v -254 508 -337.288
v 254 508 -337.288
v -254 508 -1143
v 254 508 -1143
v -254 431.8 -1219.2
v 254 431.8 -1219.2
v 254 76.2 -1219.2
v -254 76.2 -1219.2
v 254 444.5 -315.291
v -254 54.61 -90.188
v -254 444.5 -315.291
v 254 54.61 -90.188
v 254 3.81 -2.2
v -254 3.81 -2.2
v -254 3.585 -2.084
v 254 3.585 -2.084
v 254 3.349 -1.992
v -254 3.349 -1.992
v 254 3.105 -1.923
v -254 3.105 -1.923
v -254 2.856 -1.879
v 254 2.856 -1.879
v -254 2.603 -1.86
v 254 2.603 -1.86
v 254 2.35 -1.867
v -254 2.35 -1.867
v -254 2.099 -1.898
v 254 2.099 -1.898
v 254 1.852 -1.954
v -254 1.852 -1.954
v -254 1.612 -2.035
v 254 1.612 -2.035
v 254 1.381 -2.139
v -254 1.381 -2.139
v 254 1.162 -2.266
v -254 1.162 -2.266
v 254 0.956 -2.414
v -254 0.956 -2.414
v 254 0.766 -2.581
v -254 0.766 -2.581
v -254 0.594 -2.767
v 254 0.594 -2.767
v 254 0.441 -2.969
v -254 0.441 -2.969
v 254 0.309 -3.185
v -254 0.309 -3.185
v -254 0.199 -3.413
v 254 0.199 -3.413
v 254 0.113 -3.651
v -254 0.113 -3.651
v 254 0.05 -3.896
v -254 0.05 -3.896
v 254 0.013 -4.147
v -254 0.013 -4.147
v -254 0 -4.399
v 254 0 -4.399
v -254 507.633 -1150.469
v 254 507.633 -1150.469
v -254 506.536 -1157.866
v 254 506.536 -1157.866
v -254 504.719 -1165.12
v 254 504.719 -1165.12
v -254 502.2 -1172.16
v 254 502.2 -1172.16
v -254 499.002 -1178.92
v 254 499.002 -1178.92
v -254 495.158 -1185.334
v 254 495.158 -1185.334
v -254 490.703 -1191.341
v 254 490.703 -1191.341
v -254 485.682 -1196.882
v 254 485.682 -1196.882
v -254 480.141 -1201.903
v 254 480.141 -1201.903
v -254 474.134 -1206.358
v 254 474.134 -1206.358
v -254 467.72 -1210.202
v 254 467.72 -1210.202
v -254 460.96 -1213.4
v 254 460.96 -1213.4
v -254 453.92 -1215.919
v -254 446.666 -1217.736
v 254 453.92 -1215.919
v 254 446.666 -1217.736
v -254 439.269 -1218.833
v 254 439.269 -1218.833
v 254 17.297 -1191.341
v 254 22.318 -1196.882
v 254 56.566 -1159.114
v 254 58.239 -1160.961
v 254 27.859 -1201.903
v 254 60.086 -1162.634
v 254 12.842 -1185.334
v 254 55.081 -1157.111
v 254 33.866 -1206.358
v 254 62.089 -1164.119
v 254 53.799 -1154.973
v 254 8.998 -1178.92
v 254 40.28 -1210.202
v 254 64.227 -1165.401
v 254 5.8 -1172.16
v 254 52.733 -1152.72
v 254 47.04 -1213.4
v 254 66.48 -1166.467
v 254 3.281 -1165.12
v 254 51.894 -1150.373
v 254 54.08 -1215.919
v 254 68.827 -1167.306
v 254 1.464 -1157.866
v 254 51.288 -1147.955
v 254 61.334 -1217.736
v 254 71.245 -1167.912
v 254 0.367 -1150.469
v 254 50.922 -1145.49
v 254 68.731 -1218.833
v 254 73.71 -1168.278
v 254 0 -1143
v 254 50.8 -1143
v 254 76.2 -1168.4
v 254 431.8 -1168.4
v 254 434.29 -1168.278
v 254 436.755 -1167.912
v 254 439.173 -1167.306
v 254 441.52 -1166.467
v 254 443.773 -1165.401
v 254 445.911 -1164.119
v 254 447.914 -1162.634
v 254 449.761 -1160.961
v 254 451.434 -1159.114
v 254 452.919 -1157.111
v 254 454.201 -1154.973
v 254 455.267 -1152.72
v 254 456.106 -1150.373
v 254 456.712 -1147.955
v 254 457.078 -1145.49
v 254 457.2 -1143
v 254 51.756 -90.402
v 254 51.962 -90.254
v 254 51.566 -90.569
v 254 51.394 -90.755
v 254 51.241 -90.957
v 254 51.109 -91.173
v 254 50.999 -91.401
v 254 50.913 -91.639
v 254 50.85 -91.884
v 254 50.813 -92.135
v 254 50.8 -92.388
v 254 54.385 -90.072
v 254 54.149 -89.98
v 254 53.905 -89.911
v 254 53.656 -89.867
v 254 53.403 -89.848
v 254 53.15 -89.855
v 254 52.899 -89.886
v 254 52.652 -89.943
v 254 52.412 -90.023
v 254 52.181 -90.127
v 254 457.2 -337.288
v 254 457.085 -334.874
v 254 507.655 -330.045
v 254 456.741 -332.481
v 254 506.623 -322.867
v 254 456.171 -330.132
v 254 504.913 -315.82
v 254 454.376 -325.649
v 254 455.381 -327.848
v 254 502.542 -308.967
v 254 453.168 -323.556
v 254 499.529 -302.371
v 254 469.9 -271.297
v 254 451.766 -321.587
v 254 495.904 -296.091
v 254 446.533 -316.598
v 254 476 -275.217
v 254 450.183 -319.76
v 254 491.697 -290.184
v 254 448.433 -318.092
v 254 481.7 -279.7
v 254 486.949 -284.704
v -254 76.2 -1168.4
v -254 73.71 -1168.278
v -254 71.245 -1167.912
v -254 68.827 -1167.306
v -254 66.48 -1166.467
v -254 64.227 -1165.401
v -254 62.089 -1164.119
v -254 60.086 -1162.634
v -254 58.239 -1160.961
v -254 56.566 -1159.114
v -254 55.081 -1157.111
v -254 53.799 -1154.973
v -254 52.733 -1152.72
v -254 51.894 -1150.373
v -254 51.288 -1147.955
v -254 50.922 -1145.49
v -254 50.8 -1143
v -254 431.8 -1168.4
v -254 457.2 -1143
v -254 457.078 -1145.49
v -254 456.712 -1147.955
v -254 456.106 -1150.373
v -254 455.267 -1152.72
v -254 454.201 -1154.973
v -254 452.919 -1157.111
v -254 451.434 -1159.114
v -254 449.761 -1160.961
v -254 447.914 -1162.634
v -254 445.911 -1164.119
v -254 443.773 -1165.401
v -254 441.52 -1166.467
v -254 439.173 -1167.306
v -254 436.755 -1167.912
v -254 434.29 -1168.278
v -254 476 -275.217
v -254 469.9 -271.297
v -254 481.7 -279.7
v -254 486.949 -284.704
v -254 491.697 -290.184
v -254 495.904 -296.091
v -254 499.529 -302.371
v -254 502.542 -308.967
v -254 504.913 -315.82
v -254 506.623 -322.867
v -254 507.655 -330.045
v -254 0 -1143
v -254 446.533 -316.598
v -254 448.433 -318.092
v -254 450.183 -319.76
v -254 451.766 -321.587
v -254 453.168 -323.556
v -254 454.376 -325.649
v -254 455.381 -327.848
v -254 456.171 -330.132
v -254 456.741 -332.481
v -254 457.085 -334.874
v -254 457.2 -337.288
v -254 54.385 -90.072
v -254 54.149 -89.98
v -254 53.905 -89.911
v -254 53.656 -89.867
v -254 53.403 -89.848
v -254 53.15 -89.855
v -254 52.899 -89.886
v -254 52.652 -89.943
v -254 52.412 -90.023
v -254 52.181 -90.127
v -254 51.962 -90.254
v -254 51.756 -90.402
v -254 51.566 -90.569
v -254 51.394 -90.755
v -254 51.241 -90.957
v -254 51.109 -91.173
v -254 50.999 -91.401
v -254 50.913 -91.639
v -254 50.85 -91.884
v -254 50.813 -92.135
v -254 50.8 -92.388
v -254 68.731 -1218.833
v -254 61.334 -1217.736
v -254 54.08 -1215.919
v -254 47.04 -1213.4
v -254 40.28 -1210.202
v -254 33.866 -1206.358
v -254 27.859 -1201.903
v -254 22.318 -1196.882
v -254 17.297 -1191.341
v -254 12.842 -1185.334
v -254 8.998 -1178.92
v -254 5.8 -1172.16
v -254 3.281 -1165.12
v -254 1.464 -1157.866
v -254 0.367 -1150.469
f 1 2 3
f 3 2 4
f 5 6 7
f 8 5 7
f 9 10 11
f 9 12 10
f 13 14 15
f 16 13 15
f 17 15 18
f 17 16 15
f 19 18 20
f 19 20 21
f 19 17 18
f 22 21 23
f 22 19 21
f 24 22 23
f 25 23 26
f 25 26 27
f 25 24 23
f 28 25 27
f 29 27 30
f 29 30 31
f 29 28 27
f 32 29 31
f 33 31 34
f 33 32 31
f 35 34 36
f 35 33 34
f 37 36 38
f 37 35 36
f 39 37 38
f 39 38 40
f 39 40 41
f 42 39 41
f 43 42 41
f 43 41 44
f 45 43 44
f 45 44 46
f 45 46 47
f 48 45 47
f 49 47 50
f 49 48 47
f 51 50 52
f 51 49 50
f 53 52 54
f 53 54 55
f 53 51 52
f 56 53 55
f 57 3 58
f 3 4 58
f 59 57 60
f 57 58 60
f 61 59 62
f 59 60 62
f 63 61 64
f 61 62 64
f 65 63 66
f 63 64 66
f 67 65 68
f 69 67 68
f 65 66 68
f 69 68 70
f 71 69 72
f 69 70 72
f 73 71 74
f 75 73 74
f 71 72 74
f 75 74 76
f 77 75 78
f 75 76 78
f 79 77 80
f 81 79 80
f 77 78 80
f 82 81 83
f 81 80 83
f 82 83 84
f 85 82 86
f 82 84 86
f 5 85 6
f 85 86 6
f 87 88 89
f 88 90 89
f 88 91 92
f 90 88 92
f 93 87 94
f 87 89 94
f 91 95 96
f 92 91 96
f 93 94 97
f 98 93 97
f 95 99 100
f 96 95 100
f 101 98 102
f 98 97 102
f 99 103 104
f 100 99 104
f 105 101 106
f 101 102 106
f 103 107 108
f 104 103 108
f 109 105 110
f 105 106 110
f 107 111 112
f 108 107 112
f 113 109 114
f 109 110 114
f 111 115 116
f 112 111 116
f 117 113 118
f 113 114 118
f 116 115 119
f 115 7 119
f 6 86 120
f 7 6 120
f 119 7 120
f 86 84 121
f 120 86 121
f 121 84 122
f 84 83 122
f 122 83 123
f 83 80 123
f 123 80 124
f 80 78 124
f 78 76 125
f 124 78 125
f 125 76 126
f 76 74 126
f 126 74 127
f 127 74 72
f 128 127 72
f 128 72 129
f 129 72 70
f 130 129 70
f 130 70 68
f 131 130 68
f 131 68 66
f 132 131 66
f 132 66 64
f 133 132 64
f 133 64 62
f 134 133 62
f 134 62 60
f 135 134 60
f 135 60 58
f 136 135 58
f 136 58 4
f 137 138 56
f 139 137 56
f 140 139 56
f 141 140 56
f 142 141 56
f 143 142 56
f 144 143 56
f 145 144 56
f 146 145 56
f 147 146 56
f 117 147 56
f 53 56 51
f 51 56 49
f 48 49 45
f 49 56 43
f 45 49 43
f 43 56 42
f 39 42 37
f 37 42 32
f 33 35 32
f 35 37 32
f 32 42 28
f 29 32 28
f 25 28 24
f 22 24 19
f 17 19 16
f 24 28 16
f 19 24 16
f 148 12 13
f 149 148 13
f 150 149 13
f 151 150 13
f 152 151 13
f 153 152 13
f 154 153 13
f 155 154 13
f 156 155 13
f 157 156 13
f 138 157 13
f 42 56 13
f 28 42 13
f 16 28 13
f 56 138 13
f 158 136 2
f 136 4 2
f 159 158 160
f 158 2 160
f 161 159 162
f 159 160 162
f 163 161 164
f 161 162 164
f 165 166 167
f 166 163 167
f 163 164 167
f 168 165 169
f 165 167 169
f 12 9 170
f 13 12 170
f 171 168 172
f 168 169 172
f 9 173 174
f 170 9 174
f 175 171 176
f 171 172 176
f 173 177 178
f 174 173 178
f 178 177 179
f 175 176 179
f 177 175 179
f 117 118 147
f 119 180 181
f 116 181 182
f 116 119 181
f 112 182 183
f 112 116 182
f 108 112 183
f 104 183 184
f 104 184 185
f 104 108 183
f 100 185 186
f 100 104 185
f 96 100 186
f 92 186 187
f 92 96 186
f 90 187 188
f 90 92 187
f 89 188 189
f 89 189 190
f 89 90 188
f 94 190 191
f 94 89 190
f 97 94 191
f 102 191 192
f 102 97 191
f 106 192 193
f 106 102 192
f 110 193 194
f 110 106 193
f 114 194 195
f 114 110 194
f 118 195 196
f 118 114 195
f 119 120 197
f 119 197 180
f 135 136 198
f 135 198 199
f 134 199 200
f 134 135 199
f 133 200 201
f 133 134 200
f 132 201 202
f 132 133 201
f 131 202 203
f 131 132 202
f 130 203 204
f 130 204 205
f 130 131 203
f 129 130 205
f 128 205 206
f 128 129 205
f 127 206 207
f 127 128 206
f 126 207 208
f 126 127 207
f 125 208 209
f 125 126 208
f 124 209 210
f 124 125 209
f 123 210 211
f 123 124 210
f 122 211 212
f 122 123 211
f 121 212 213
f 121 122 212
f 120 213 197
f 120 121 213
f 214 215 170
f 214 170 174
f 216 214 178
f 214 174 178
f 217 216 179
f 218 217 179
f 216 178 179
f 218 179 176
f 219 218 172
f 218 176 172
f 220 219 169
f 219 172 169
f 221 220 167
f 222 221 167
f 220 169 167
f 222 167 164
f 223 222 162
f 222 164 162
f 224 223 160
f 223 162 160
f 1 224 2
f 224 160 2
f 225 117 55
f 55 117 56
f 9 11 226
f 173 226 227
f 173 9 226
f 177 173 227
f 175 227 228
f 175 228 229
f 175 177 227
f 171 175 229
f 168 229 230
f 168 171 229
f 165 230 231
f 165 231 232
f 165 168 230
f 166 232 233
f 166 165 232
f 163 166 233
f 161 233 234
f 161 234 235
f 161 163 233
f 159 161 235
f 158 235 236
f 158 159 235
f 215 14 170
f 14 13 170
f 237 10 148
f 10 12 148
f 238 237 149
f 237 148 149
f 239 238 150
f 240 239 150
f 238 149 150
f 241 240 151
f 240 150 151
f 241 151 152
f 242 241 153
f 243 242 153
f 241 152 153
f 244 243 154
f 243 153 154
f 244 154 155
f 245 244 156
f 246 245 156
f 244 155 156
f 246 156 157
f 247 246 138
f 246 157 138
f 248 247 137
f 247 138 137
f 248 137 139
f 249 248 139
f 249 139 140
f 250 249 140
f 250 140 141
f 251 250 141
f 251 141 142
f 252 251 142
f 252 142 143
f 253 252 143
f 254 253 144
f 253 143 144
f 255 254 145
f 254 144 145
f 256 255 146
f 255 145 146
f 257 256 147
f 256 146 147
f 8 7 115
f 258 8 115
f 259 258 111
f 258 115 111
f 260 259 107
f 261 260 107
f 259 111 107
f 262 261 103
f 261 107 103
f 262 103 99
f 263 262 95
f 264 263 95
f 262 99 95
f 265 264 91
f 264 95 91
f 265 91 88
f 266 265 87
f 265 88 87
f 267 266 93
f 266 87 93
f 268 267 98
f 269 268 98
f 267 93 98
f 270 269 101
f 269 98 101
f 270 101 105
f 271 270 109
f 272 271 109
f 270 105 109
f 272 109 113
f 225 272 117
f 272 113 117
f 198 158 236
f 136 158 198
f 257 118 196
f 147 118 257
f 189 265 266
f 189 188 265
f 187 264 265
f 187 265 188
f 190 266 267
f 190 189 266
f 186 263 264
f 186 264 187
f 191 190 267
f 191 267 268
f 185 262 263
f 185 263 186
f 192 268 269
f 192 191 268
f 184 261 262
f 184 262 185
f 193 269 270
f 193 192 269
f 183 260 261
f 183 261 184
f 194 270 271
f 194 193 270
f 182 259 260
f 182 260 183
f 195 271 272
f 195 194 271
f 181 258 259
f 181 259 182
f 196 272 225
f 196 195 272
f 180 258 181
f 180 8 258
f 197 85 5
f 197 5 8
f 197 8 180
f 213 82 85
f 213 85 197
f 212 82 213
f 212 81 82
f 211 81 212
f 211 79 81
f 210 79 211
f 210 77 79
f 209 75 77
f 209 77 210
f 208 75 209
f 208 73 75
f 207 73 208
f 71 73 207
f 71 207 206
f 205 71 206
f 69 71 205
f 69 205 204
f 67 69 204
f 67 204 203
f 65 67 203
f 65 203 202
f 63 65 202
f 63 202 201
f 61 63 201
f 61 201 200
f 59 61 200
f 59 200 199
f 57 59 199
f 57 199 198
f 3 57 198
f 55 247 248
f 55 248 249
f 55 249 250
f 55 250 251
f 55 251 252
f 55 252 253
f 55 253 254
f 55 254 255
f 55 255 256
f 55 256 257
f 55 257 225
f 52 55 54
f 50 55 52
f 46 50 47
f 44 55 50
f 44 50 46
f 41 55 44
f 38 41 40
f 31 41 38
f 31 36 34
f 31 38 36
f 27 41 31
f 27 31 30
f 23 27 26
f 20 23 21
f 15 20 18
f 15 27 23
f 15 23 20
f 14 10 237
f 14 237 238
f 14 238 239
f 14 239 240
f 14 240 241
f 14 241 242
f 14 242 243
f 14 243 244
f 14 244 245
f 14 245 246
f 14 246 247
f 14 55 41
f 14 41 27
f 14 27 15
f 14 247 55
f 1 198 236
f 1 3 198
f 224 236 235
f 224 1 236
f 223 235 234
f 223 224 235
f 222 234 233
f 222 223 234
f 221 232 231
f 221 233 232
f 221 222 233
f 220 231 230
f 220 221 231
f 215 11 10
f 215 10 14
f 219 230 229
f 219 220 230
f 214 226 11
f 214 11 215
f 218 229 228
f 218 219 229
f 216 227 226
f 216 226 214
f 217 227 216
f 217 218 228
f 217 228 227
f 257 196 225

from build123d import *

# Parameters (mm, degrees)
BOSS_EXTRUDE1_DEPTH = 254
FILLET1_R           = 2.54


with BuildPart() as part:
    # Sketch1 → Boss-Extrude1 (new, symmetric)
    with BuildSketch(Plane(origin=(0, 0, 0), x_dir=(0, 0, -1), z_dir=(1, 0, 0))):
        with BuildLine():
            Line((0, 0), (271.296891492, 469.9))
            ThreePointArc((271.296891492, 469.9), (299.188027261, 497.791135768), (337.288027261, 508))
            Line((337.288027261, 508), (1143, 508))
            ThreePointArc((1143, 508), (1196.881536726, 485.681536726), (1219.2, 431.8))
            Line((1219.2, 431.8), (1219.2, 76.2))
            ThreePointArc((1219.2, 76.2), (1196.881536726, 22.318463274), (1143, 0))
            Line((1143, 0), (0, 0))
        make_face()
        with BuildLine():
            Line((337.288027261, 457.2), (1143, 457.2))
            ThreePointArc((1143, 457.2), (1160.960512242, 449.760512242), (1168.4, 431.8))
            Line((1168.4, 431.8), (1168.4, 76.2))
            ThreePointArc((1168.4, 76.2), (1160.960512242, 58.239487758), (1143, 50.8))
            Line((1143, 50.8), (87.988181024, 50.8))
            Line((87.988181024, 50.8), (315.290982004, 444.5))
            ThreePointArc((315.290982004, 444.5), (324.588027261, 453.797045256), (337.288027261, 457.2))
        make_face(mode=Mode.SUBTRACT)
    extrude(amount=BOSS_EXTRUDE1_DEPTH, both=True)

    # Fillet1
    fillet1_edges = [part.edges().sort_by_distance(p)[0] for p in [
        (0, 0, 0),
        (0, 50.8, -87.988181024),
    ]]
    fillet(fillet1_edges, radius=FILLET1_R)


solid = part.part
